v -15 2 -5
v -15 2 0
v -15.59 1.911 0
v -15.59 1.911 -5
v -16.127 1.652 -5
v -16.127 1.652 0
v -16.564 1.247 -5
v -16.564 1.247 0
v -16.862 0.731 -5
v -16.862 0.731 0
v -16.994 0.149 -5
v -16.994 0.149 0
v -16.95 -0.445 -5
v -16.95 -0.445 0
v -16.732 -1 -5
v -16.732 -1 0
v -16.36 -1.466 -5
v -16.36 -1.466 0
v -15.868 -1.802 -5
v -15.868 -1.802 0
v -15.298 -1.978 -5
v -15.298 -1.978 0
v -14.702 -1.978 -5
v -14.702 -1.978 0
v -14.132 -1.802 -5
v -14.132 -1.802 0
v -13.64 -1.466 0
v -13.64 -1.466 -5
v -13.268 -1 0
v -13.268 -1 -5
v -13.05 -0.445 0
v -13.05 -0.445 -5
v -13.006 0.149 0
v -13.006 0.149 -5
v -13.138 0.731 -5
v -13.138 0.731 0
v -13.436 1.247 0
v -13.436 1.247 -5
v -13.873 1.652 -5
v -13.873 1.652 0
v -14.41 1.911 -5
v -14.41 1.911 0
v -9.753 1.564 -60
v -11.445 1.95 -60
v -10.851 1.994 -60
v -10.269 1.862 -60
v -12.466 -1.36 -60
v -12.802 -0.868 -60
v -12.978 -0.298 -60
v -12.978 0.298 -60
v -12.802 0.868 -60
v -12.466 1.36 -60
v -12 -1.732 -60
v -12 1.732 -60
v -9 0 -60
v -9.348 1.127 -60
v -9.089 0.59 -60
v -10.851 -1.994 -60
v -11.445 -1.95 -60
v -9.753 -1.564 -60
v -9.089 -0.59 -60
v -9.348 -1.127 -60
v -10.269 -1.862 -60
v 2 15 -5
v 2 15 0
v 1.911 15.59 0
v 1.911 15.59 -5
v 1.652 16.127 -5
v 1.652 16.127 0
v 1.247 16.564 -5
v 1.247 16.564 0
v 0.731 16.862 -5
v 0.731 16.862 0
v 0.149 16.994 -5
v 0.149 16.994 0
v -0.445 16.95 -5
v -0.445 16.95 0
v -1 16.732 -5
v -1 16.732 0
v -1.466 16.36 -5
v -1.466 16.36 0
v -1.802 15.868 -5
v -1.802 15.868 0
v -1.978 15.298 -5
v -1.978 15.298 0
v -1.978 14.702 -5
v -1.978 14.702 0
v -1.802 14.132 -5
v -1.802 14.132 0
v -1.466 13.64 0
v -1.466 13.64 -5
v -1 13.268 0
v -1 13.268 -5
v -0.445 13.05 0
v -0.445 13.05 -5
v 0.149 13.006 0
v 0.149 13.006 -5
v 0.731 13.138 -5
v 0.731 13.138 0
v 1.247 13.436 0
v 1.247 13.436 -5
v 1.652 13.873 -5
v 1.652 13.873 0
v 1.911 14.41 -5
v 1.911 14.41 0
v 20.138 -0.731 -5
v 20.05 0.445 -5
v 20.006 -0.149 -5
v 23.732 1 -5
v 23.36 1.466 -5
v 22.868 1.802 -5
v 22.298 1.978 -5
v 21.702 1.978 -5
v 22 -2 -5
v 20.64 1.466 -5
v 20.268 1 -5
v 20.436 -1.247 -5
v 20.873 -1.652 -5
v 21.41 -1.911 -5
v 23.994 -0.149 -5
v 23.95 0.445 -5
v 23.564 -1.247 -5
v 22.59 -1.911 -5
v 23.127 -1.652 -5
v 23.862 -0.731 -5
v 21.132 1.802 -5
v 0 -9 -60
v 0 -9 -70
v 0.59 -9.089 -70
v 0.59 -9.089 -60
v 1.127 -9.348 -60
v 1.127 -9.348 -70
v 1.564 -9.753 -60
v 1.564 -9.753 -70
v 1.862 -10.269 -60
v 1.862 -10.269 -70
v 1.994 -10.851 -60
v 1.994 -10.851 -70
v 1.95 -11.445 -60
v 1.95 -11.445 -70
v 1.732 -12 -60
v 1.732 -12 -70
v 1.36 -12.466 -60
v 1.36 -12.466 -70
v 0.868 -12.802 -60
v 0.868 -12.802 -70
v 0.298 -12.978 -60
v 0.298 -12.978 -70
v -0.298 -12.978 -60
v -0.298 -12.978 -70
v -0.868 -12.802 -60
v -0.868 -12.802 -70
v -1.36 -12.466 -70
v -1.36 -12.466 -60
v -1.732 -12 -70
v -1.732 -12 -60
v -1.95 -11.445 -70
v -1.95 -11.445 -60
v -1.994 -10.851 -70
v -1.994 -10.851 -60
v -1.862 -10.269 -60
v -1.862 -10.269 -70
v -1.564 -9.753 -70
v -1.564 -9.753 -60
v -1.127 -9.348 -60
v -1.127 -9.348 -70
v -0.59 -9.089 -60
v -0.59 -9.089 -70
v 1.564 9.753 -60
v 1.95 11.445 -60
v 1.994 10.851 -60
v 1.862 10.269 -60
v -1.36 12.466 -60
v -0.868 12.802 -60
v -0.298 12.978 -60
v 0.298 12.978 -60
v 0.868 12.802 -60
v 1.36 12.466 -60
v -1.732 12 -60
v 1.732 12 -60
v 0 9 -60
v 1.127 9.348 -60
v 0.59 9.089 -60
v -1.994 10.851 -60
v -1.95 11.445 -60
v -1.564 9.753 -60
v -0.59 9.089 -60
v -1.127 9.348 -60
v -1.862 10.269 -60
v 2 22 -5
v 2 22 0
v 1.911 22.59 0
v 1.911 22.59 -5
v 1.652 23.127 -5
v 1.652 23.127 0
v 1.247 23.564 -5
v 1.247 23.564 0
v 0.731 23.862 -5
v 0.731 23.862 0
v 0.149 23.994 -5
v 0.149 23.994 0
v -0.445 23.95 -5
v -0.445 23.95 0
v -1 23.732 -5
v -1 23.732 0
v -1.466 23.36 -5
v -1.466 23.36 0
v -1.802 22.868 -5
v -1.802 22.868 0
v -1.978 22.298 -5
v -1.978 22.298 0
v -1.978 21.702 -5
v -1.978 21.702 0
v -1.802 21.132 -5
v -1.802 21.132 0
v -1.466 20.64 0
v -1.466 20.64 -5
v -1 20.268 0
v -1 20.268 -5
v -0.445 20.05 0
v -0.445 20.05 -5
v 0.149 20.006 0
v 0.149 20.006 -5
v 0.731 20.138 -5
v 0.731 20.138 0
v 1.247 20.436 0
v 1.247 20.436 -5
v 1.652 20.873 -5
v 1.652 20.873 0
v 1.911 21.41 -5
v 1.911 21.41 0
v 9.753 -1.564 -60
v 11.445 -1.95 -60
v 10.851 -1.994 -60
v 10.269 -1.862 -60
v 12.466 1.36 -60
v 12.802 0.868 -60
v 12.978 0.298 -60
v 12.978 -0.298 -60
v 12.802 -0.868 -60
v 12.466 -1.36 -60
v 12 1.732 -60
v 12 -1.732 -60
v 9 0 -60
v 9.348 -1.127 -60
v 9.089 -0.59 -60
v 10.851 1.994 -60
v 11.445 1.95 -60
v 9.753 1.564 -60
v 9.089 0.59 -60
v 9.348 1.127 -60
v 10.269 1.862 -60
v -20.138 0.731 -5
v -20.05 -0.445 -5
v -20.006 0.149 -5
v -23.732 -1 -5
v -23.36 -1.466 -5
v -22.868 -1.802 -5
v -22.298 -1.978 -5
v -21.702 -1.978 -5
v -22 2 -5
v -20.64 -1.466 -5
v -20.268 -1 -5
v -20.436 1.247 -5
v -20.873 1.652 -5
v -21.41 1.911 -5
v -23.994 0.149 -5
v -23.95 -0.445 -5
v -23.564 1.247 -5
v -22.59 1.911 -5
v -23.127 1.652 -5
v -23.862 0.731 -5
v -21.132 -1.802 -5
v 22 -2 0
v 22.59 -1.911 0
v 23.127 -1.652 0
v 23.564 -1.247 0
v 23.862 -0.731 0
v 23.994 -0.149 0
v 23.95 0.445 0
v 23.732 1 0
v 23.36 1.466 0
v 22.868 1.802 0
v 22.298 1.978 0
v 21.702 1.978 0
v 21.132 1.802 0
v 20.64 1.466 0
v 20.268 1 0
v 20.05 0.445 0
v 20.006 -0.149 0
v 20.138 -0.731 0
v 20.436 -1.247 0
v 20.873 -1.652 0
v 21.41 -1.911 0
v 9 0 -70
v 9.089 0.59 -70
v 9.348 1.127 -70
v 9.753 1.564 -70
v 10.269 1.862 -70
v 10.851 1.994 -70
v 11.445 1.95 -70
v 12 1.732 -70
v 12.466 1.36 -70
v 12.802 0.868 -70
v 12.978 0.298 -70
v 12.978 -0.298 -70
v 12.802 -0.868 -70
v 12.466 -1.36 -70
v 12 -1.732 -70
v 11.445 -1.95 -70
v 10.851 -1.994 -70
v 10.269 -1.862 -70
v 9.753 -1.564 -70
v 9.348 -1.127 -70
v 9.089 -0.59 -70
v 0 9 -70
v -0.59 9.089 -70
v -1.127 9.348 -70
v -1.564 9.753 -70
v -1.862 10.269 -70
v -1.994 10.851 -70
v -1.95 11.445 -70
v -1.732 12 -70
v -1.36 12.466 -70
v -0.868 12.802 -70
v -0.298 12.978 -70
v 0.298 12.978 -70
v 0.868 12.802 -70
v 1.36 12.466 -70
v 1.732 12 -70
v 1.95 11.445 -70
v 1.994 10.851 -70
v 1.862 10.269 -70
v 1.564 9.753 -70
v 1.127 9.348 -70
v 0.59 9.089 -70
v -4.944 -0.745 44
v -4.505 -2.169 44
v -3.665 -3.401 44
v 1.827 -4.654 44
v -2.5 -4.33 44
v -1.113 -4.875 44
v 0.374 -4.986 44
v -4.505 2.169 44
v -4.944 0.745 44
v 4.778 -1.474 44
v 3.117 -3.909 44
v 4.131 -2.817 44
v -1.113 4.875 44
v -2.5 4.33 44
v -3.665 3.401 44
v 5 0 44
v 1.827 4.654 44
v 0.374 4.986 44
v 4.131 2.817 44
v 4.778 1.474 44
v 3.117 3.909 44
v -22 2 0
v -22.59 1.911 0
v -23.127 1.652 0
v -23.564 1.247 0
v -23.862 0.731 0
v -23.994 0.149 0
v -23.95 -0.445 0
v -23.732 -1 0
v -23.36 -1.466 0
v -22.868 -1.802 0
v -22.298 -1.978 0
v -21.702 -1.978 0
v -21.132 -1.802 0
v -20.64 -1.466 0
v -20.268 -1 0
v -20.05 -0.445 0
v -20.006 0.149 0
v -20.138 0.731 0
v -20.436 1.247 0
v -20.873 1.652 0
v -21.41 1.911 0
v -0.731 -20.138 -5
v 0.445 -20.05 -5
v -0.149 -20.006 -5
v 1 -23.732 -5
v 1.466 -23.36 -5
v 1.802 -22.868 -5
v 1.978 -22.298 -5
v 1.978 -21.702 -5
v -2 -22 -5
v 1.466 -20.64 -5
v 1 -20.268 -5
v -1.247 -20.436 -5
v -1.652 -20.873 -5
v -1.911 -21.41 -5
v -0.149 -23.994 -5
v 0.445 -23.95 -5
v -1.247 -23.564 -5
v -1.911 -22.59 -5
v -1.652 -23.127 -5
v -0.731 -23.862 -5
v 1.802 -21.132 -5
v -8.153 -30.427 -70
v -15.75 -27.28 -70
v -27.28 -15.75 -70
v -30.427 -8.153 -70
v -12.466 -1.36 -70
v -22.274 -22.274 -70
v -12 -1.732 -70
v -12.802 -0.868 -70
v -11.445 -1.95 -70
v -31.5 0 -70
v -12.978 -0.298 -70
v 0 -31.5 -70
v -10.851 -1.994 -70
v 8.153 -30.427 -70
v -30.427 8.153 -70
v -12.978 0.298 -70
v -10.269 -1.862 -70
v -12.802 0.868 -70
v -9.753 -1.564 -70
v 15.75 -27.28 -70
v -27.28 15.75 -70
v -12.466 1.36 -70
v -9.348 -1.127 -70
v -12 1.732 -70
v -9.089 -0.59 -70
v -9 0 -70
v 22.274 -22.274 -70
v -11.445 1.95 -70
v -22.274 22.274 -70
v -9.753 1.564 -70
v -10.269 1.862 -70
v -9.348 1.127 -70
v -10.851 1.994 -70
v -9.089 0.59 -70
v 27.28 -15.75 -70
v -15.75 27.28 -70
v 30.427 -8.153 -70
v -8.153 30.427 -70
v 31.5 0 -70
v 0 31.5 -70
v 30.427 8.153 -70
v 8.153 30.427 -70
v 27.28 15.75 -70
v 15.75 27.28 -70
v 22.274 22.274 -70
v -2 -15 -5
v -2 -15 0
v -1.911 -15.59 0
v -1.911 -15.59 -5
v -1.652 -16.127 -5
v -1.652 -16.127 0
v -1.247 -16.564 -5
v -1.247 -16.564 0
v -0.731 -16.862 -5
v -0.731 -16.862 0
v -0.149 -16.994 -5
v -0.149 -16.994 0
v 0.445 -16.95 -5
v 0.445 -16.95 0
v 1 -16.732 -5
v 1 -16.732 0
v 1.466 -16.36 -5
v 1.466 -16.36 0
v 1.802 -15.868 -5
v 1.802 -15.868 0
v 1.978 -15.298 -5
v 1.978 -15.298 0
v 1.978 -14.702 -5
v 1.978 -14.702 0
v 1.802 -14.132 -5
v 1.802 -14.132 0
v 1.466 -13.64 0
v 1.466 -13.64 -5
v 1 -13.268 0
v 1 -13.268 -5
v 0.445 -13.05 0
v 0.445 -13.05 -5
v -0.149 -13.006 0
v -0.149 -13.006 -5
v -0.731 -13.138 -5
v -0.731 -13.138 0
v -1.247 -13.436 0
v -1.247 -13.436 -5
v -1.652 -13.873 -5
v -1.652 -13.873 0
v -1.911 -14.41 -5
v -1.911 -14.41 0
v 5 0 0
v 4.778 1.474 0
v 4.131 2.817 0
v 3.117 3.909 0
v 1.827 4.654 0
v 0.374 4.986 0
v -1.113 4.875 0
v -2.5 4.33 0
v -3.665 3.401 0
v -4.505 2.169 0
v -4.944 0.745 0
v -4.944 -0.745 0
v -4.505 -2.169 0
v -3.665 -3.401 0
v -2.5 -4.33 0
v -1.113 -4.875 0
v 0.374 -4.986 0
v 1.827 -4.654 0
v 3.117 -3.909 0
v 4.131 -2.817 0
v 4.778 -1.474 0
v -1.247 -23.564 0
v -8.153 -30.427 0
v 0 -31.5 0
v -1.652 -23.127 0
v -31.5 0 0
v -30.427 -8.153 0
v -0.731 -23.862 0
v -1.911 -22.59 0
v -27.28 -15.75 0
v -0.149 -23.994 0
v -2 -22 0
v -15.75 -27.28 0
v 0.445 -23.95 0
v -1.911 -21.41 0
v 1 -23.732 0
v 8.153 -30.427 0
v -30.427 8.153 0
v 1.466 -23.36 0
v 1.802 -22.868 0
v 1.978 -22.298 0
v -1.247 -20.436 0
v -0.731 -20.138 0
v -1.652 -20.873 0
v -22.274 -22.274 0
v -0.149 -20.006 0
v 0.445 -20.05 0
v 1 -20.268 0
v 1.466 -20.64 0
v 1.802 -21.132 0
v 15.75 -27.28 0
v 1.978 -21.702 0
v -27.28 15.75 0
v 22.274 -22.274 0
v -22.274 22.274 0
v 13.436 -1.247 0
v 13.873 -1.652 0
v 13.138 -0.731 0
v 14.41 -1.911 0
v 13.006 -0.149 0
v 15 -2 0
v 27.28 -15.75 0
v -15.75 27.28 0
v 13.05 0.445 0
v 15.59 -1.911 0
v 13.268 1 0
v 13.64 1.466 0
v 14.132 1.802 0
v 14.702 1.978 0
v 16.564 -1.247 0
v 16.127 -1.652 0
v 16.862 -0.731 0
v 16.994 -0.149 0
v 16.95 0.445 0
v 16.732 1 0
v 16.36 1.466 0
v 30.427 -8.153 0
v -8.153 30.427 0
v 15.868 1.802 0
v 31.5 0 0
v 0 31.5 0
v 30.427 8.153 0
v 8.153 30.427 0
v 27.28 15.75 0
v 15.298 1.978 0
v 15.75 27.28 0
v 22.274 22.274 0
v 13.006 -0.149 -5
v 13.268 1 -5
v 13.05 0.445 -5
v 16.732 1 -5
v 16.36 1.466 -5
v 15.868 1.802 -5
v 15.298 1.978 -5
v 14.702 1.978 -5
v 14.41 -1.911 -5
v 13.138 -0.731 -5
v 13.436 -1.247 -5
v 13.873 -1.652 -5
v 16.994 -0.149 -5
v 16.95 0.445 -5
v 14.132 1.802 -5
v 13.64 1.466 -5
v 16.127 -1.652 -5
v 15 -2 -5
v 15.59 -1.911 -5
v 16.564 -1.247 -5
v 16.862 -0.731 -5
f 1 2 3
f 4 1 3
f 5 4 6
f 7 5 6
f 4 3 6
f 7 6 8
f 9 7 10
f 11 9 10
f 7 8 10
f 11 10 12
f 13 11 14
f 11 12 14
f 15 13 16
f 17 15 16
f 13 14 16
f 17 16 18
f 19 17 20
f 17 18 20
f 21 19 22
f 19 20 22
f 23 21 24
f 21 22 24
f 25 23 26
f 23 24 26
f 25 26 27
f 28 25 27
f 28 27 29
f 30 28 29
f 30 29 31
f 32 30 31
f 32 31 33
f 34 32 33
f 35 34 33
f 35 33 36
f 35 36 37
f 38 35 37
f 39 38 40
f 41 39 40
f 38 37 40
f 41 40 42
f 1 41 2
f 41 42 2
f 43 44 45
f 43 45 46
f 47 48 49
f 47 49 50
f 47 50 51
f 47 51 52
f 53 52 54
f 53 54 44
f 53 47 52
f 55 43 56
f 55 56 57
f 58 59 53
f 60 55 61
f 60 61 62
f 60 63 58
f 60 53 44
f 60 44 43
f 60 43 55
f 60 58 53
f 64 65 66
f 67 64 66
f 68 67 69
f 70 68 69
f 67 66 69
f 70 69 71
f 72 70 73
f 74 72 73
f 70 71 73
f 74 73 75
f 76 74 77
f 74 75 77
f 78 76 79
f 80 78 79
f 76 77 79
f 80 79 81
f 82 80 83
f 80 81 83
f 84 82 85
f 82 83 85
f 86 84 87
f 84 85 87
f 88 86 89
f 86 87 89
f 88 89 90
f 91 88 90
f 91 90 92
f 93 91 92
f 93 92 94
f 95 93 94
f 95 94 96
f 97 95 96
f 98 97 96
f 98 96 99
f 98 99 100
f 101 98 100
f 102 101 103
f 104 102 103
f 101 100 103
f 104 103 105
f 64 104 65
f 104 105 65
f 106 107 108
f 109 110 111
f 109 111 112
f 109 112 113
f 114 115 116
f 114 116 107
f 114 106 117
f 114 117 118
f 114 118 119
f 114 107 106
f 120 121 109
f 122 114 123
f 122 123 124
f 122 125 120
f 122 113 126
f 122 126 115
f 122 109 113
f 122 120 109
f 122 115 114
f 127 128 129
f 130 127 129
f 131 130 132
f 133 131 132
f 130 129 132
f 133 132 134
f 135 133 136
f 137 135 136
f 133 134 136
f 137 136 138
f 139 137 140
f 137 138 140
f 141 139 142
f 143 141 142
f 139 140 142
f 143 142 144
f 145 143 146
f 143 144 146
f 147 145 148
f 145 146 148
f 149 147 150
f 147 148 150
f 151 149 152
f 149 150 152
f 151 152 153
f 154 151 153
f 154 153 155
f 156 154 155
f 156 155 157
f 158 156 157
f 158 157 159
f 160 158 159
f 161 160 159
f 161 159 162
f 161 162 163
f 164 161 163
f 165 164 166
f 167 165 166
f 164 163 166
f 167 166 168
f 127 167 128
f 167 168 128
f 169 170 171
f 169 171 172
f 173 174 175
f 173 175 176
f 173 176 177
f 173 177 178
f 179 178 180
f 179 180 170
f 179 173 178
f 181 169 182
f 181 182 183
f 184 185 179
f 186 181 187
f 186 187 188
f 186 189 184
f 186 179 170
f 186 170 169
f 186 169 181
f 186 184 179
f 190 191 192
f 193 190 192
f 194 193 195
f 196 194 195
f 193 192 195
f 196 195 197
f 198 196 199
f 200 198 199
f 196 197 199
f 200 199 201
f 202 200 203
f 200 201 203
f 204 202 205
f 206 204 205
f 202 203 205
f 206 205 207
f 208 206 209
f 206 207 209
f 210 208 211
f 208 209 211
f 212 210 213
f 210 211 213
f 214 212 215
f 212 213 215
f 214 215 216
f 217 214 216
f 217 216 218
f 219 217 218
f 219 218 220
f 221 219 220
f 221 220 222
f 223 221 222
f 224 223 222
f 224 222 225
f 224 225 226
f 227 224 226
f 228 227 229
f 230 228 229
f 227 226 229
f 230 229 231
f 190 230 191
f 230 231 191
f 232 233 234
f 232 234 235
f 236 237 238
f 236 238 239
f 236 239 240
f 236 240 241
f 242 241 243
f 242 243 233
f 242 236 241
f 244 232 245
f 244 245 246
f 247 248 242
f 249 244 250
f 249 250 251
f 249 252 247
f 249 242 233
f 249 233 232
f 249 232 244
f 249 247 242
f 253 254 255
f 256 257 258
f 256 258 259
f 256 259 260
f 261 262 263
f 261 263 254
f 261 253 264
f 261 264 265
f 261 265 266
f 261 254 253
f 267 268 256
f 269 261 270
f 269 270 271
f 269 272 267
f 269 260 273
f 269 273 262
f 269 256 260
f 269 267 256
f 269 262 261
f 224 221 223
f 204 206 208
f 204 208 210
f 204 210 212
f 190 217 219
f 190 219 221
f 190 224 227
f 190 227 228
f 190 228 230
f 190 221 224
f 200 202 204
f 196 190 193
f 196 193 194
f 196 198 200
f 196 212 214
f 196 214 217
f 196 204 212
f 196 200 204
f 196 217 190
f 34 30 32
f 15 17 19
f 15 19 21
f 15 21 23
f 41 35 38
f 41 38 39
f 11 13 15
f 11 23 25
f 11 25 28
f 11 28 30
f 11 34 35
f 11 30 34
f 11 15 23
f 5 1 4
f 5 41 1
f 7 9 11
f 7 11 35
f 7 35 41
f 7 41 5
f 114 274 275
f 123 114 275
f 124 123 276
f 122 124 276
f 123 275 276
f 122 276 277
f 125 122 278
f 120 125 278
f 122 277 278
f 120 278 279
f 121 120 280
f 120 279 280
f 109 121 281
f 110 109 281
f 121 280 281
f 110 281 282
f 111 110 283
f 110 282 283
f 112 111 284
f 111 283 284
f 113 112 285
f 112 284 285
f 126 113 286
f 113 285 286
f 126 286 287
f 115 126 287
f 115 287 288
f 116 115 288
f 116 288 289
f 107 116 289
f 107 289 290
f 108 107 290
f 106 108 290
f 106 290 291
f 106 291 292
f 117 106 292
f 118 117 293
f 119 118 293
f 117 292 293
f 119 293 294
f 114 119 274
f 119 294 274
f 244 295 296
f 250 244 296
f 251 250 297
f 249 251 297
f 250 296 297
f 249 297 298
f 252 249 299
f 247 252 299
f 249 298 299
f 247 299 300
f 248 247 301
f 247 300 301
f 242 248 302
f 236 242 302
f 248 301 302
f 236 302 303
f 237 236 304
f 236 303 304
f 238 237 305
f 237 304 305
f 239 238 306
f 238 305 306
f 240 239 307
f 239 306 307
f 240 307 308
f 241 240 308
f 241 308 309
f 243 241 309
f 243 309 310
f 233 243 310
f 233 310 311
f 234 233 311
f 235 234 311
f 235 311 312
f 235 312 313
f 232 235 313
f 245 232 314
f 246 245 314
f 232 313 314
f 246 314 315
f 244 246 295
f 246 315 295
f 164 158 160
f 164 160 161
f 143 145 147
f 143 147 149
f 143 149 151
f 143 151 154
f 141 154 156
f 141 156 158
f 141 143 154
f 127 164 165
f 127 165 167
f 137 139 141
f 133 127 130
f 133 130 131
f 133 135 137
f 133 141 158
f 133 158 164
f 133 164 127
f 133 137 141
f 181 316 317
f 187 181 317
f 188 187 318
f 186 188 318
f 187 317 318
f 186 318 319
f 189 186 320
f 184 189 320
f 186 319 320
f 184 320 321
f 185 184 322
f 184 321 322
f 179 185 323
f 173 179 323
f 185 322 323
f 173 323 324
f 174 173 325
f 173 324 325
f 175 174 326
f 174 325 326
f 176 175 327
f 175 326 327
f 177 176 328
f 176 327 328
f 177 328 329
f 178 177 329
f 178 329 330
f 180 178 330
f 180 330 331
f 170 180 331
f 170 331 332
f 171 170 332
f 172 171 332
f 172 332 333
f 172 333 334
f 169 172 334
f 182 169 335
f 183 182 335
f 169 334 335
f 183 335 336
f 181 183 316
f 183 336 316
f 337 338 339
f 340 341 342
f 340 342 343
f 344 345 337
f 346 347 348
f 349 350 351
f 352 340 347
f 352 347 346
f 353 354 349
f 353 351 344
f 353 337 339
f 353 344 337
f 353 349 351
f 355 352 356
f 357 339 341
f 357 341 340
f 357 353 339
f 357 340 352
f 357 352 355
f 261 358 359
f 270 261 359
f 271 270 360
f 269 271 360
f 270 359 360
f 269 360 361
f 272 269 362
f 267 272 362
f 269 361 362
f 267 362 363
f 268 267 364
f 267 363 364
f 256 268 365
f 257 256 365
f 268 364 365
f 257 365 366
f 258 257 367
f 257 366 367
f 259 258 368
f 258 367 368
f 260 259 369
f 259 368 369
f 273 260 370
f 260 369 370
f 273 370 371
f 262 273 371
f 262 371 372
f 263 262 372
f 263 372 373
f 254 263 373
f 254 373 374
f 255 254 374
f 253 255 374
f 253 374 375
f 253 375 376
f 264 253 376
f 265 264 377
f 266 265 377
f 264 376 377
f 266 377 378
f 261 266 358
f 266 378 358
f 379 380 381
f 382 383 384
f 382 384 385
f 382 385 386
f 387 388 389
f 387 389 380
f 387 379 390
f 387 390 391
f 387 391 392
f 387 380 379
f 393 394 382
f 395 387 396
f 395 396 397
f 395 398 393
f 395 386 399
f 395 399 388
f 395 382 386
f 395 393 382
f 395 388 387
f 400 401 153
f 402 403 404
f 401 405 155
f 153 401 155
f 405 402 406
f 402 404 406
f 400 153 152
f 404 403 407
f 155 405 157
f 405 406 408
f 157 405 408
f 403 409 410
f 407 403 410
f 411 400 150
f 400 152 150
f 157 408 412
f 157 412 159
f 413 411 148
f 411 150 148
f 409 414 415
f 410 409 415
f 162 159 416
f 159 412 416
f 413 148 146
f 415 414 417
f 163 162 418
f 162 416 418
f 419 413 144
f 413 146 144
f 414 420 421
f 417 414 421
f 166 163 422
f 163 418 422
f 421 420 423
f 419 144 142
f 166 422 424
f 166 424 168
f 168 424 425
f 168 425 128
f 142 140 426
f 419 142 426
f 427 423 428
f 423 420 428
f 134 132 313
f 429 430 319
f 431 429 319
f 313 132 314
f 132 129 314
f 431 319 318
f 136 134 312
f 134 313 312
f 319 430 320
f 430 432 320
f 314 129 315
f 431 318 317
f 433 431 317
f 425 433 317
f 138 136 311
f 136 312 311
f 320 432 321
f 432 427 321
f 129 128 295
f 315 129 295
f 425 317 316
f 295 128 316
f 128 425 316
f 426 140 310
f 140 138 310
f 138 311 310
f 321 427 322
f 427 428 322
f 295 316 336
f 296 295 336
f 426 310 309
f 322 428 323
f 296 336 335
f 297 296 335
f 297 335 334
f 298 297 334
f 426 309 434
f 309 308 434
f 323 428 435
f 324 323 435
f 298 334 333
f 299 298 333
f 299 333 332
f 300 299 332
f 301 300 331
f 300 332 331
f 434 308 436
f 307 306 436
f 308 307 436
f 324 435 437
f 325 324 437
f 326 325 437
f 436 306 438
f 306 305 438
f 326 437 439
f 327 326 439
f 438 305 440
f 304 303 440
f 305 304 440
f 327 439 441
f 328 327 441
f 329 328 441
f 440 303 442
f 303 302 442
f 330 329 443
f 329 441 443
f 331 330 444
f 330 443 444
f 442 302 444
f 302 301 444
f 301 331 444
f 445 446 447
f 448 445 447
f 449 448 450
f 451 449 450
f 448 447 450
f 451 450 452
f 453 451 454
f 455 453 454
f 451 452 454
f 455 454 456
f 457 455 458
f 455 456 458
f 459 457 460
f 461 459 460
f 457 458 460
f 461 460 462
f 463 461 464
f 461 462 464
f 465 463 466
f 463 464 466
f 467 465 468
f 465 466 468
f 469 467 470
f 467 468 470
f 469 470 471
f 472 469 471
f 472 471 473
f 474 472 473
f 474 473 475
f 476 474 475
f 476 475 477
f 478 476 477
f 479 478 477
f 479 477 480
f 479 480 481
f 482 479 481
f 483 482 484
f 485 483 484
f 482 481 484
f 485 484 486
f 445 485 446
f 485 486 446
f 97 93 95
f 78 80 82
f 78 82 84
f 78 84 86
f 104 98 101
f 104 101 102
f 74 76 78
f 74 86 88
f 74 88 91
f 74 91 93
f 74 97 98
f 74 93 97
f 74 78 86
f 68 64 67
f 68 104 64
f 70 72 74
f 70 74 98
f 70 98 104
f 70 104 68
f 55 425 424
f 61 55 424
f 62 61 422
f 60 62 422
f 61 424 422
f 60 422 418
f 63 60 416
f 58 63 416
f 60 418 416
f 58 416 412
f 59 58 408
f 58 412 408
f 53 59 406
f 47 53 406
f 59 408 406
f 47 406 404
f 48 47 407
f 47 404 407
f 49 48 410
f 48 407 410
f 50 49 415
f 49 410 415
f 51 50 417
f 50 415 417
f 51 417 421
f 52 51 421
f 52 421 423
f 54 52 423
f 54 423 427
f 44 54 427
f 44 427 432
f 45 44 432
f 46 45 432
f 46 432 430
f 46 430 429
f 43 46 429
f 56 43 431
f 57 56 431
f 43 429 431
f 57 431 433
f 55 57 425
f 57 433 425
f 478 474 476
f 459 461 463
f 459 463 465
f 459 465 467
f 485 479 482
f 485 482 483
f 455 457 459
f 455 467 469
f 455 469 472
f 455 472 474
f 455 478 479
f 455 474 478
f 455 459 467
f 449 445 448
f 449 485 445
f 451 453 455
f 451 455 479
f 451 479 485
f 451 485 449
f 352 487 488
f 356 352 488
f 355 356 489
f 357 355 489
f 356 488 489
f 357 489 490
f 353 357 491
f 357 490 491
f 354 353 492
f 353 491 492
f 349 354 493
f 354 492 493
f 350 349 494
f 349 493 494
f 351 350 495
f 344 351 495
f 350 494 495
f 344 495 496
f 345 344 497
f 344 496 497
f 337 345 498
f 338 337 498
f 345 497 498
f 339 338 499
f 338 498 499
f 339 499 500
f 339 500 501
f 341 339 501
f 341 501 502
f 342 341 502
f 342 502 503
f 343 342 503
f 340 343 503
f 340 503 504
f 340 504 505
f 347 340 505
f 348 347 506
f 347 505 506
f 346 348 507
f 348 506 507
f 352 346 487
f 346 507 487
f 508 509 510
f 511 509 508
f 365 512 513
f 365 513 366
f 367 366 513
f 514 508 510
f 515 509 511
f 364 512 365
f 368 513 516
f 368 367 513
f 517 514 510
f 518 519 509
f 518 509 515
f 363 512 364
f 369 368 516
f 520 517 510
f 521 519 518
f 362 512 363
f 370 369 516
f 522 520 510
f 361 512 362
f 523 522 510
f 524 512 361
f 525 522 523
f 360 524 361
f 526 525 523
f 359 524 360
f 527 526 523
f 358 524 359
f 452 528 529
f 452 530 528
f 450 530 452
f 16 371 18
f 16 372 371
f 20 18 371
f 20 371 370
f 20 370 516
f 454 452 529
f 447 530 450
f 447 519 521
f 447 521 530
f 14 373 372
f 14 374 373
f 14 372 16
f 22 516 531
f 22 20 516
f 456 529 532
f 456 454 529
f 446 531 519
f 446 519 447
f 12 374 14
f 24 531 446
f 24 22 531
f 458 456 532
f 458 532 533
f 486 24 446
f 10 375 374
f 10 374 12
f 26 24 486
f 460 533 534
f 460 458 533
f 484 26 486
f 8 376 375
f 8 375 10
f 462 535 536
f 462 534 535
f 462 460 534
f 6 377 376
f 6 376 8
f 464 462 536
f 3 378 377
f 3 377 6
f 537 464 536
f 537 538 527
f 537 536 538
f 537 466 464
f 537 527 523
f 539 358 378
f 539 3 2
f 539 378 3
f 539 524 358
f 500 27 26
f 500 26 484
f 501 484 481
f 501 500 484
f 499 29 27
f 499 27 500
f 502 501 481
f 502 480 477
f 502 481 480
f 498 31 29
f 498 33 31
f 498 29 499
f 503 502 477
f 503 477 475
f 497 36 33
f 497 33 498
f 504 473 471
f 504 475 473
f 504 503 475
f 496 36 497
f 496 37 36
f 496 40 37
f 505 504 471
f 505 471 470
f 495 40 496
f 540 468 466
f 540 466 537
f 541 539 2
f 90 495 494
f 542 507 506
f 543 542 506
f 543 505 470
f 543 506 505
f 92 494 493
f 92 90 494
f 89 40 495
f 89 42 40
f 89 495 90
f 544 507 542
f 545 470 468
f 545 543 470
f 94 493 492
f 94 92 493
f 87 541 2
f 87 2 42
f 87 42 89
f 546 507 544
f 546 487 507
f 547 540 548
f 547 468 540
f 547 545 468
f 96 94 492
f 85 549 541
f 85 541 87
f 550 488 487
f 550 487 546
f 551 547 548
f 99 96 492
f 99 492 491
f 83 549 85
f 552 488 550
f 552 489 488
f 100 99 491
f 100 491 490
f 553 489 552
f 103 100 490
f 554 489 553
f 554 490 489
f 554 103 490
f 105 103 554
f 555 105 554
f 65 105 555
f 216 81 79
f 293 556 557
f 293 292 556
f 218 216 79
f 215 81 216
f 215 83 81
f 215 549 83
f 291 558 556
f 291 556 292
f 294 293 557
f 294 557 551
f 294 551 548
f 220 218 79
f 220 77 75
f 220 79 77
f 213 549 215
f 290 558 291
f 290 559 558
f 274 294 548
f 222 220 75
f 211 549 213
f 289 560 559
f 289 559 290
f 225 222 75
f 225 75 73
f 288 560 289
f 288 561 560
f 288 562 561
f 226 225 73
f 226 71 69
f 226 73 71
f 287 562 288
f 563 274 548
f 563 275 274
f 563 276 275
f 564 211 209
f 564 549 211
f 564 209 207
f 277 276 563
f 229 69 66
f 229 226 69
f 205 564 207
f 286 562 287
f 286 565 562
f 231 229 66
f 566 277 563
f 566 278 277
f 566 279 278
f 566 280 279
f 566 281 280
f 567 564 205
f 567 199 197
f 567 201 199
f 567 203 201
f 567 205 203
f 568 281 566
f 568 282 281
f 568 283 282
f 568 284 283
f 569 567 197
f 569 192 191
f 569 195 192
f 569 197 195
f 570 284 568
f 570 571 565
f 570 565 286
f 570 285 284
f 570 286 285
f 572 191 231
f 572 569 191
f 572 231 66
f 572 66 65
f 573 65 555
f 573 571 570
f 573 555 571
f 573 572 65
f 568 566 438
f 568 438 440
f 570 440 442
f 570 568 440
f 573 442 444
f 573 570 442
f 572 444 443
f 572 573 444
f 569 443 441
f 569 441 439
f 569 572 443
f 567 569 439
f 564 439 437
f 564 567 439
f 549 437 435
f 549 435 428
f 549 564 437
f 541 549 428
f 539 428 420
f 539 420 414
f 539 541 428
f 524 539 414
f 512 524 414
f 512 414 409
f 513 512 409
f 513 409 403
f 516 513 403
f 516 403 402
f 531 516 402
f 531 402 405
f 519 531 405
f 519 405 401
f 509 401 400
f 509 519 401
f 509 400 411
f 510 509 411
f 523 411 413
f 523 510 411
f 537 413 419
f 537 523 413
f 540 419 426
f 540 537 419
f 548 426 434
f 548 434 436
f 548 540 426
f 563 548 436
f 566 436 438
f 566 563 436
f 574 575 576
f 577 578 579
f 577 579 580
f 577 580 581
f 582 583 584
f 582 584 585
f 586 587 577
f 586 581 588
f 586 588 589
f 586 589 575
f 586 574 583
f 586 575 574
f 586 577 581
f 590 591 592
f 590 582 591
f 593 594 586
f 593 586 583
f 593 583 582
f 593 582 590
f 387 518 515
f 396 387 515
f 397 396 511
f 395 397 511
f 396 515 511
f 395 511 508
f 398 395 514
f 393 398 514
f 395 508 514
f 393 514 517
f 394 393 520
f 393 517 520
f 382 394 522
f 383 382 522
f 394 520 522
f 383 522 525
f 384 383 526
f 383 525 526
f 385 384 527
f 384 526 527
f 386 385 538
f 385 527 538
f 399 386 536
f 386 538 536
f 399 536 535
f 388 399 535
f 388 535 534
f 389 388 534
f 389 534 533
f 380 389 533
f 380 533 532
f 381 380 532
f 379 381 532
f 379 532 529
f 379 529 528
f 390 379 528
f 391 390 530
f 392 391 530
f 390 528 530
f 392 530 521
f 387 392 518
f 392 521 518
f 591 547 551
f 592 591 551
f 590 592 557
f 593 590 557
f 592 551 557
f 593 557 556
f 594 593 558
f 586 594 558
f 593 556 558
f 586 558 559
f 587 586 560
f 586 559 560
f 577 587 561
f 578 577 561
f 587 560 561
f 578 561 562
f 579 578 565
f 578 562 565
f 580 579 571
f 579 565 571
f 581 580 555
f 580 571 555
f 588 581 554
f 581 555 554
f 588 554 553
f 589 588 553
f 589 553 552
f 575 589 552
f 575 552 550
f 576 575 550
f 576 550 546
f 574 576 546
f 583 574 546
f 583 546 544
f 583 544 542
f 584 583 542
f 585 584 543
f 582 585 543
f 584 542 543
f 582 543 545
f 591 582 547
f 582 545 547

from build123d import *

# Parameters (mm, degrees)
SKETCH1_R           = 31.5
BOSS_EXTRUDE1_DEPTH = 70
SKETCH2_R           = 5
BOSS_EXTRUDE2_DEPTH = 44
SKETCH5_R           = 2
CUT_EXTRUDE2_DEPTH  = 10
SKETCH6_R           = 2
CUT_EXTRUDE3_DEPTH  = 5
CIRPATTERN1_COUNT   = 4
CIRPATTERN2_COUNT   = 4


with BuildPart() as part:
    # Sketch1 → Boss-Extrude1 (new body)
    with BuildSketch(Plane.XY):
        Circle(SKETCH1_R)
    extrude(amount=-BOSS_EXTRUDE1_DEPTH)

    # Sketch2 → Boss-Extrude2 (add)
    with BuildSketch(Plane.XY):
        Circle(SKETCH2_R)
    extrude(amount=BOSS_EXTRUDE2_DEPTH)

    # Sketch5 → Cut-Extrude2 (cut)
    with BuildSketch(Plane(origin=(0, 0, -70), x_dir=(-1, 0, 0), z_dir=(0, 0, -1))):
        with Locations((-11, 0)):
            Circle(SKETCH5_R)
    cut_extrude2 = extrude(amount=-CUT_EXTRUDE2_DEPTH, mode=Mode.SUBTRACT)

    # Sketch6 → Cut-Extrude3 (cut)
    with BuildSketch(Plane.XY):
        with Locations((0, 15)):
            Circle(SKETCH6_R)
        with Locations((0, 22)):
            Circle(SKETCH6_R)
    cut_extrude3 = extrude(amount=-CUT_EXTRUDE3_DEPTH, mode=Mode.SUBTRACT)

    # CirPattern1: Cut-Extrude3 ×4 about axis
    cirpattern1_axis = Axis((0, 0, 0), (0, 0, 1))
    for i in range(1, CIRPATTERN1_COUNT):
        add(cut_extrude3.rotate(cirpattern1_axis, i * 360 / CIRPATTERN1_COUNT), mode=Mode.SUBTRACT)

    # CirPattern2: Cut-Extrude2 ×4 about axis
    cirpattern2_axis = Axis((0, 0, 0), (0, 0, 1))
    for i in range(1, CIRPATTERN2_COUNT):
        add(cut_extrude2.rotate(cirpattern2_axis, i * 360 / CIRPATTERN2_COUNT), mode=Mode.SUBTRACT)


solid = part.part
